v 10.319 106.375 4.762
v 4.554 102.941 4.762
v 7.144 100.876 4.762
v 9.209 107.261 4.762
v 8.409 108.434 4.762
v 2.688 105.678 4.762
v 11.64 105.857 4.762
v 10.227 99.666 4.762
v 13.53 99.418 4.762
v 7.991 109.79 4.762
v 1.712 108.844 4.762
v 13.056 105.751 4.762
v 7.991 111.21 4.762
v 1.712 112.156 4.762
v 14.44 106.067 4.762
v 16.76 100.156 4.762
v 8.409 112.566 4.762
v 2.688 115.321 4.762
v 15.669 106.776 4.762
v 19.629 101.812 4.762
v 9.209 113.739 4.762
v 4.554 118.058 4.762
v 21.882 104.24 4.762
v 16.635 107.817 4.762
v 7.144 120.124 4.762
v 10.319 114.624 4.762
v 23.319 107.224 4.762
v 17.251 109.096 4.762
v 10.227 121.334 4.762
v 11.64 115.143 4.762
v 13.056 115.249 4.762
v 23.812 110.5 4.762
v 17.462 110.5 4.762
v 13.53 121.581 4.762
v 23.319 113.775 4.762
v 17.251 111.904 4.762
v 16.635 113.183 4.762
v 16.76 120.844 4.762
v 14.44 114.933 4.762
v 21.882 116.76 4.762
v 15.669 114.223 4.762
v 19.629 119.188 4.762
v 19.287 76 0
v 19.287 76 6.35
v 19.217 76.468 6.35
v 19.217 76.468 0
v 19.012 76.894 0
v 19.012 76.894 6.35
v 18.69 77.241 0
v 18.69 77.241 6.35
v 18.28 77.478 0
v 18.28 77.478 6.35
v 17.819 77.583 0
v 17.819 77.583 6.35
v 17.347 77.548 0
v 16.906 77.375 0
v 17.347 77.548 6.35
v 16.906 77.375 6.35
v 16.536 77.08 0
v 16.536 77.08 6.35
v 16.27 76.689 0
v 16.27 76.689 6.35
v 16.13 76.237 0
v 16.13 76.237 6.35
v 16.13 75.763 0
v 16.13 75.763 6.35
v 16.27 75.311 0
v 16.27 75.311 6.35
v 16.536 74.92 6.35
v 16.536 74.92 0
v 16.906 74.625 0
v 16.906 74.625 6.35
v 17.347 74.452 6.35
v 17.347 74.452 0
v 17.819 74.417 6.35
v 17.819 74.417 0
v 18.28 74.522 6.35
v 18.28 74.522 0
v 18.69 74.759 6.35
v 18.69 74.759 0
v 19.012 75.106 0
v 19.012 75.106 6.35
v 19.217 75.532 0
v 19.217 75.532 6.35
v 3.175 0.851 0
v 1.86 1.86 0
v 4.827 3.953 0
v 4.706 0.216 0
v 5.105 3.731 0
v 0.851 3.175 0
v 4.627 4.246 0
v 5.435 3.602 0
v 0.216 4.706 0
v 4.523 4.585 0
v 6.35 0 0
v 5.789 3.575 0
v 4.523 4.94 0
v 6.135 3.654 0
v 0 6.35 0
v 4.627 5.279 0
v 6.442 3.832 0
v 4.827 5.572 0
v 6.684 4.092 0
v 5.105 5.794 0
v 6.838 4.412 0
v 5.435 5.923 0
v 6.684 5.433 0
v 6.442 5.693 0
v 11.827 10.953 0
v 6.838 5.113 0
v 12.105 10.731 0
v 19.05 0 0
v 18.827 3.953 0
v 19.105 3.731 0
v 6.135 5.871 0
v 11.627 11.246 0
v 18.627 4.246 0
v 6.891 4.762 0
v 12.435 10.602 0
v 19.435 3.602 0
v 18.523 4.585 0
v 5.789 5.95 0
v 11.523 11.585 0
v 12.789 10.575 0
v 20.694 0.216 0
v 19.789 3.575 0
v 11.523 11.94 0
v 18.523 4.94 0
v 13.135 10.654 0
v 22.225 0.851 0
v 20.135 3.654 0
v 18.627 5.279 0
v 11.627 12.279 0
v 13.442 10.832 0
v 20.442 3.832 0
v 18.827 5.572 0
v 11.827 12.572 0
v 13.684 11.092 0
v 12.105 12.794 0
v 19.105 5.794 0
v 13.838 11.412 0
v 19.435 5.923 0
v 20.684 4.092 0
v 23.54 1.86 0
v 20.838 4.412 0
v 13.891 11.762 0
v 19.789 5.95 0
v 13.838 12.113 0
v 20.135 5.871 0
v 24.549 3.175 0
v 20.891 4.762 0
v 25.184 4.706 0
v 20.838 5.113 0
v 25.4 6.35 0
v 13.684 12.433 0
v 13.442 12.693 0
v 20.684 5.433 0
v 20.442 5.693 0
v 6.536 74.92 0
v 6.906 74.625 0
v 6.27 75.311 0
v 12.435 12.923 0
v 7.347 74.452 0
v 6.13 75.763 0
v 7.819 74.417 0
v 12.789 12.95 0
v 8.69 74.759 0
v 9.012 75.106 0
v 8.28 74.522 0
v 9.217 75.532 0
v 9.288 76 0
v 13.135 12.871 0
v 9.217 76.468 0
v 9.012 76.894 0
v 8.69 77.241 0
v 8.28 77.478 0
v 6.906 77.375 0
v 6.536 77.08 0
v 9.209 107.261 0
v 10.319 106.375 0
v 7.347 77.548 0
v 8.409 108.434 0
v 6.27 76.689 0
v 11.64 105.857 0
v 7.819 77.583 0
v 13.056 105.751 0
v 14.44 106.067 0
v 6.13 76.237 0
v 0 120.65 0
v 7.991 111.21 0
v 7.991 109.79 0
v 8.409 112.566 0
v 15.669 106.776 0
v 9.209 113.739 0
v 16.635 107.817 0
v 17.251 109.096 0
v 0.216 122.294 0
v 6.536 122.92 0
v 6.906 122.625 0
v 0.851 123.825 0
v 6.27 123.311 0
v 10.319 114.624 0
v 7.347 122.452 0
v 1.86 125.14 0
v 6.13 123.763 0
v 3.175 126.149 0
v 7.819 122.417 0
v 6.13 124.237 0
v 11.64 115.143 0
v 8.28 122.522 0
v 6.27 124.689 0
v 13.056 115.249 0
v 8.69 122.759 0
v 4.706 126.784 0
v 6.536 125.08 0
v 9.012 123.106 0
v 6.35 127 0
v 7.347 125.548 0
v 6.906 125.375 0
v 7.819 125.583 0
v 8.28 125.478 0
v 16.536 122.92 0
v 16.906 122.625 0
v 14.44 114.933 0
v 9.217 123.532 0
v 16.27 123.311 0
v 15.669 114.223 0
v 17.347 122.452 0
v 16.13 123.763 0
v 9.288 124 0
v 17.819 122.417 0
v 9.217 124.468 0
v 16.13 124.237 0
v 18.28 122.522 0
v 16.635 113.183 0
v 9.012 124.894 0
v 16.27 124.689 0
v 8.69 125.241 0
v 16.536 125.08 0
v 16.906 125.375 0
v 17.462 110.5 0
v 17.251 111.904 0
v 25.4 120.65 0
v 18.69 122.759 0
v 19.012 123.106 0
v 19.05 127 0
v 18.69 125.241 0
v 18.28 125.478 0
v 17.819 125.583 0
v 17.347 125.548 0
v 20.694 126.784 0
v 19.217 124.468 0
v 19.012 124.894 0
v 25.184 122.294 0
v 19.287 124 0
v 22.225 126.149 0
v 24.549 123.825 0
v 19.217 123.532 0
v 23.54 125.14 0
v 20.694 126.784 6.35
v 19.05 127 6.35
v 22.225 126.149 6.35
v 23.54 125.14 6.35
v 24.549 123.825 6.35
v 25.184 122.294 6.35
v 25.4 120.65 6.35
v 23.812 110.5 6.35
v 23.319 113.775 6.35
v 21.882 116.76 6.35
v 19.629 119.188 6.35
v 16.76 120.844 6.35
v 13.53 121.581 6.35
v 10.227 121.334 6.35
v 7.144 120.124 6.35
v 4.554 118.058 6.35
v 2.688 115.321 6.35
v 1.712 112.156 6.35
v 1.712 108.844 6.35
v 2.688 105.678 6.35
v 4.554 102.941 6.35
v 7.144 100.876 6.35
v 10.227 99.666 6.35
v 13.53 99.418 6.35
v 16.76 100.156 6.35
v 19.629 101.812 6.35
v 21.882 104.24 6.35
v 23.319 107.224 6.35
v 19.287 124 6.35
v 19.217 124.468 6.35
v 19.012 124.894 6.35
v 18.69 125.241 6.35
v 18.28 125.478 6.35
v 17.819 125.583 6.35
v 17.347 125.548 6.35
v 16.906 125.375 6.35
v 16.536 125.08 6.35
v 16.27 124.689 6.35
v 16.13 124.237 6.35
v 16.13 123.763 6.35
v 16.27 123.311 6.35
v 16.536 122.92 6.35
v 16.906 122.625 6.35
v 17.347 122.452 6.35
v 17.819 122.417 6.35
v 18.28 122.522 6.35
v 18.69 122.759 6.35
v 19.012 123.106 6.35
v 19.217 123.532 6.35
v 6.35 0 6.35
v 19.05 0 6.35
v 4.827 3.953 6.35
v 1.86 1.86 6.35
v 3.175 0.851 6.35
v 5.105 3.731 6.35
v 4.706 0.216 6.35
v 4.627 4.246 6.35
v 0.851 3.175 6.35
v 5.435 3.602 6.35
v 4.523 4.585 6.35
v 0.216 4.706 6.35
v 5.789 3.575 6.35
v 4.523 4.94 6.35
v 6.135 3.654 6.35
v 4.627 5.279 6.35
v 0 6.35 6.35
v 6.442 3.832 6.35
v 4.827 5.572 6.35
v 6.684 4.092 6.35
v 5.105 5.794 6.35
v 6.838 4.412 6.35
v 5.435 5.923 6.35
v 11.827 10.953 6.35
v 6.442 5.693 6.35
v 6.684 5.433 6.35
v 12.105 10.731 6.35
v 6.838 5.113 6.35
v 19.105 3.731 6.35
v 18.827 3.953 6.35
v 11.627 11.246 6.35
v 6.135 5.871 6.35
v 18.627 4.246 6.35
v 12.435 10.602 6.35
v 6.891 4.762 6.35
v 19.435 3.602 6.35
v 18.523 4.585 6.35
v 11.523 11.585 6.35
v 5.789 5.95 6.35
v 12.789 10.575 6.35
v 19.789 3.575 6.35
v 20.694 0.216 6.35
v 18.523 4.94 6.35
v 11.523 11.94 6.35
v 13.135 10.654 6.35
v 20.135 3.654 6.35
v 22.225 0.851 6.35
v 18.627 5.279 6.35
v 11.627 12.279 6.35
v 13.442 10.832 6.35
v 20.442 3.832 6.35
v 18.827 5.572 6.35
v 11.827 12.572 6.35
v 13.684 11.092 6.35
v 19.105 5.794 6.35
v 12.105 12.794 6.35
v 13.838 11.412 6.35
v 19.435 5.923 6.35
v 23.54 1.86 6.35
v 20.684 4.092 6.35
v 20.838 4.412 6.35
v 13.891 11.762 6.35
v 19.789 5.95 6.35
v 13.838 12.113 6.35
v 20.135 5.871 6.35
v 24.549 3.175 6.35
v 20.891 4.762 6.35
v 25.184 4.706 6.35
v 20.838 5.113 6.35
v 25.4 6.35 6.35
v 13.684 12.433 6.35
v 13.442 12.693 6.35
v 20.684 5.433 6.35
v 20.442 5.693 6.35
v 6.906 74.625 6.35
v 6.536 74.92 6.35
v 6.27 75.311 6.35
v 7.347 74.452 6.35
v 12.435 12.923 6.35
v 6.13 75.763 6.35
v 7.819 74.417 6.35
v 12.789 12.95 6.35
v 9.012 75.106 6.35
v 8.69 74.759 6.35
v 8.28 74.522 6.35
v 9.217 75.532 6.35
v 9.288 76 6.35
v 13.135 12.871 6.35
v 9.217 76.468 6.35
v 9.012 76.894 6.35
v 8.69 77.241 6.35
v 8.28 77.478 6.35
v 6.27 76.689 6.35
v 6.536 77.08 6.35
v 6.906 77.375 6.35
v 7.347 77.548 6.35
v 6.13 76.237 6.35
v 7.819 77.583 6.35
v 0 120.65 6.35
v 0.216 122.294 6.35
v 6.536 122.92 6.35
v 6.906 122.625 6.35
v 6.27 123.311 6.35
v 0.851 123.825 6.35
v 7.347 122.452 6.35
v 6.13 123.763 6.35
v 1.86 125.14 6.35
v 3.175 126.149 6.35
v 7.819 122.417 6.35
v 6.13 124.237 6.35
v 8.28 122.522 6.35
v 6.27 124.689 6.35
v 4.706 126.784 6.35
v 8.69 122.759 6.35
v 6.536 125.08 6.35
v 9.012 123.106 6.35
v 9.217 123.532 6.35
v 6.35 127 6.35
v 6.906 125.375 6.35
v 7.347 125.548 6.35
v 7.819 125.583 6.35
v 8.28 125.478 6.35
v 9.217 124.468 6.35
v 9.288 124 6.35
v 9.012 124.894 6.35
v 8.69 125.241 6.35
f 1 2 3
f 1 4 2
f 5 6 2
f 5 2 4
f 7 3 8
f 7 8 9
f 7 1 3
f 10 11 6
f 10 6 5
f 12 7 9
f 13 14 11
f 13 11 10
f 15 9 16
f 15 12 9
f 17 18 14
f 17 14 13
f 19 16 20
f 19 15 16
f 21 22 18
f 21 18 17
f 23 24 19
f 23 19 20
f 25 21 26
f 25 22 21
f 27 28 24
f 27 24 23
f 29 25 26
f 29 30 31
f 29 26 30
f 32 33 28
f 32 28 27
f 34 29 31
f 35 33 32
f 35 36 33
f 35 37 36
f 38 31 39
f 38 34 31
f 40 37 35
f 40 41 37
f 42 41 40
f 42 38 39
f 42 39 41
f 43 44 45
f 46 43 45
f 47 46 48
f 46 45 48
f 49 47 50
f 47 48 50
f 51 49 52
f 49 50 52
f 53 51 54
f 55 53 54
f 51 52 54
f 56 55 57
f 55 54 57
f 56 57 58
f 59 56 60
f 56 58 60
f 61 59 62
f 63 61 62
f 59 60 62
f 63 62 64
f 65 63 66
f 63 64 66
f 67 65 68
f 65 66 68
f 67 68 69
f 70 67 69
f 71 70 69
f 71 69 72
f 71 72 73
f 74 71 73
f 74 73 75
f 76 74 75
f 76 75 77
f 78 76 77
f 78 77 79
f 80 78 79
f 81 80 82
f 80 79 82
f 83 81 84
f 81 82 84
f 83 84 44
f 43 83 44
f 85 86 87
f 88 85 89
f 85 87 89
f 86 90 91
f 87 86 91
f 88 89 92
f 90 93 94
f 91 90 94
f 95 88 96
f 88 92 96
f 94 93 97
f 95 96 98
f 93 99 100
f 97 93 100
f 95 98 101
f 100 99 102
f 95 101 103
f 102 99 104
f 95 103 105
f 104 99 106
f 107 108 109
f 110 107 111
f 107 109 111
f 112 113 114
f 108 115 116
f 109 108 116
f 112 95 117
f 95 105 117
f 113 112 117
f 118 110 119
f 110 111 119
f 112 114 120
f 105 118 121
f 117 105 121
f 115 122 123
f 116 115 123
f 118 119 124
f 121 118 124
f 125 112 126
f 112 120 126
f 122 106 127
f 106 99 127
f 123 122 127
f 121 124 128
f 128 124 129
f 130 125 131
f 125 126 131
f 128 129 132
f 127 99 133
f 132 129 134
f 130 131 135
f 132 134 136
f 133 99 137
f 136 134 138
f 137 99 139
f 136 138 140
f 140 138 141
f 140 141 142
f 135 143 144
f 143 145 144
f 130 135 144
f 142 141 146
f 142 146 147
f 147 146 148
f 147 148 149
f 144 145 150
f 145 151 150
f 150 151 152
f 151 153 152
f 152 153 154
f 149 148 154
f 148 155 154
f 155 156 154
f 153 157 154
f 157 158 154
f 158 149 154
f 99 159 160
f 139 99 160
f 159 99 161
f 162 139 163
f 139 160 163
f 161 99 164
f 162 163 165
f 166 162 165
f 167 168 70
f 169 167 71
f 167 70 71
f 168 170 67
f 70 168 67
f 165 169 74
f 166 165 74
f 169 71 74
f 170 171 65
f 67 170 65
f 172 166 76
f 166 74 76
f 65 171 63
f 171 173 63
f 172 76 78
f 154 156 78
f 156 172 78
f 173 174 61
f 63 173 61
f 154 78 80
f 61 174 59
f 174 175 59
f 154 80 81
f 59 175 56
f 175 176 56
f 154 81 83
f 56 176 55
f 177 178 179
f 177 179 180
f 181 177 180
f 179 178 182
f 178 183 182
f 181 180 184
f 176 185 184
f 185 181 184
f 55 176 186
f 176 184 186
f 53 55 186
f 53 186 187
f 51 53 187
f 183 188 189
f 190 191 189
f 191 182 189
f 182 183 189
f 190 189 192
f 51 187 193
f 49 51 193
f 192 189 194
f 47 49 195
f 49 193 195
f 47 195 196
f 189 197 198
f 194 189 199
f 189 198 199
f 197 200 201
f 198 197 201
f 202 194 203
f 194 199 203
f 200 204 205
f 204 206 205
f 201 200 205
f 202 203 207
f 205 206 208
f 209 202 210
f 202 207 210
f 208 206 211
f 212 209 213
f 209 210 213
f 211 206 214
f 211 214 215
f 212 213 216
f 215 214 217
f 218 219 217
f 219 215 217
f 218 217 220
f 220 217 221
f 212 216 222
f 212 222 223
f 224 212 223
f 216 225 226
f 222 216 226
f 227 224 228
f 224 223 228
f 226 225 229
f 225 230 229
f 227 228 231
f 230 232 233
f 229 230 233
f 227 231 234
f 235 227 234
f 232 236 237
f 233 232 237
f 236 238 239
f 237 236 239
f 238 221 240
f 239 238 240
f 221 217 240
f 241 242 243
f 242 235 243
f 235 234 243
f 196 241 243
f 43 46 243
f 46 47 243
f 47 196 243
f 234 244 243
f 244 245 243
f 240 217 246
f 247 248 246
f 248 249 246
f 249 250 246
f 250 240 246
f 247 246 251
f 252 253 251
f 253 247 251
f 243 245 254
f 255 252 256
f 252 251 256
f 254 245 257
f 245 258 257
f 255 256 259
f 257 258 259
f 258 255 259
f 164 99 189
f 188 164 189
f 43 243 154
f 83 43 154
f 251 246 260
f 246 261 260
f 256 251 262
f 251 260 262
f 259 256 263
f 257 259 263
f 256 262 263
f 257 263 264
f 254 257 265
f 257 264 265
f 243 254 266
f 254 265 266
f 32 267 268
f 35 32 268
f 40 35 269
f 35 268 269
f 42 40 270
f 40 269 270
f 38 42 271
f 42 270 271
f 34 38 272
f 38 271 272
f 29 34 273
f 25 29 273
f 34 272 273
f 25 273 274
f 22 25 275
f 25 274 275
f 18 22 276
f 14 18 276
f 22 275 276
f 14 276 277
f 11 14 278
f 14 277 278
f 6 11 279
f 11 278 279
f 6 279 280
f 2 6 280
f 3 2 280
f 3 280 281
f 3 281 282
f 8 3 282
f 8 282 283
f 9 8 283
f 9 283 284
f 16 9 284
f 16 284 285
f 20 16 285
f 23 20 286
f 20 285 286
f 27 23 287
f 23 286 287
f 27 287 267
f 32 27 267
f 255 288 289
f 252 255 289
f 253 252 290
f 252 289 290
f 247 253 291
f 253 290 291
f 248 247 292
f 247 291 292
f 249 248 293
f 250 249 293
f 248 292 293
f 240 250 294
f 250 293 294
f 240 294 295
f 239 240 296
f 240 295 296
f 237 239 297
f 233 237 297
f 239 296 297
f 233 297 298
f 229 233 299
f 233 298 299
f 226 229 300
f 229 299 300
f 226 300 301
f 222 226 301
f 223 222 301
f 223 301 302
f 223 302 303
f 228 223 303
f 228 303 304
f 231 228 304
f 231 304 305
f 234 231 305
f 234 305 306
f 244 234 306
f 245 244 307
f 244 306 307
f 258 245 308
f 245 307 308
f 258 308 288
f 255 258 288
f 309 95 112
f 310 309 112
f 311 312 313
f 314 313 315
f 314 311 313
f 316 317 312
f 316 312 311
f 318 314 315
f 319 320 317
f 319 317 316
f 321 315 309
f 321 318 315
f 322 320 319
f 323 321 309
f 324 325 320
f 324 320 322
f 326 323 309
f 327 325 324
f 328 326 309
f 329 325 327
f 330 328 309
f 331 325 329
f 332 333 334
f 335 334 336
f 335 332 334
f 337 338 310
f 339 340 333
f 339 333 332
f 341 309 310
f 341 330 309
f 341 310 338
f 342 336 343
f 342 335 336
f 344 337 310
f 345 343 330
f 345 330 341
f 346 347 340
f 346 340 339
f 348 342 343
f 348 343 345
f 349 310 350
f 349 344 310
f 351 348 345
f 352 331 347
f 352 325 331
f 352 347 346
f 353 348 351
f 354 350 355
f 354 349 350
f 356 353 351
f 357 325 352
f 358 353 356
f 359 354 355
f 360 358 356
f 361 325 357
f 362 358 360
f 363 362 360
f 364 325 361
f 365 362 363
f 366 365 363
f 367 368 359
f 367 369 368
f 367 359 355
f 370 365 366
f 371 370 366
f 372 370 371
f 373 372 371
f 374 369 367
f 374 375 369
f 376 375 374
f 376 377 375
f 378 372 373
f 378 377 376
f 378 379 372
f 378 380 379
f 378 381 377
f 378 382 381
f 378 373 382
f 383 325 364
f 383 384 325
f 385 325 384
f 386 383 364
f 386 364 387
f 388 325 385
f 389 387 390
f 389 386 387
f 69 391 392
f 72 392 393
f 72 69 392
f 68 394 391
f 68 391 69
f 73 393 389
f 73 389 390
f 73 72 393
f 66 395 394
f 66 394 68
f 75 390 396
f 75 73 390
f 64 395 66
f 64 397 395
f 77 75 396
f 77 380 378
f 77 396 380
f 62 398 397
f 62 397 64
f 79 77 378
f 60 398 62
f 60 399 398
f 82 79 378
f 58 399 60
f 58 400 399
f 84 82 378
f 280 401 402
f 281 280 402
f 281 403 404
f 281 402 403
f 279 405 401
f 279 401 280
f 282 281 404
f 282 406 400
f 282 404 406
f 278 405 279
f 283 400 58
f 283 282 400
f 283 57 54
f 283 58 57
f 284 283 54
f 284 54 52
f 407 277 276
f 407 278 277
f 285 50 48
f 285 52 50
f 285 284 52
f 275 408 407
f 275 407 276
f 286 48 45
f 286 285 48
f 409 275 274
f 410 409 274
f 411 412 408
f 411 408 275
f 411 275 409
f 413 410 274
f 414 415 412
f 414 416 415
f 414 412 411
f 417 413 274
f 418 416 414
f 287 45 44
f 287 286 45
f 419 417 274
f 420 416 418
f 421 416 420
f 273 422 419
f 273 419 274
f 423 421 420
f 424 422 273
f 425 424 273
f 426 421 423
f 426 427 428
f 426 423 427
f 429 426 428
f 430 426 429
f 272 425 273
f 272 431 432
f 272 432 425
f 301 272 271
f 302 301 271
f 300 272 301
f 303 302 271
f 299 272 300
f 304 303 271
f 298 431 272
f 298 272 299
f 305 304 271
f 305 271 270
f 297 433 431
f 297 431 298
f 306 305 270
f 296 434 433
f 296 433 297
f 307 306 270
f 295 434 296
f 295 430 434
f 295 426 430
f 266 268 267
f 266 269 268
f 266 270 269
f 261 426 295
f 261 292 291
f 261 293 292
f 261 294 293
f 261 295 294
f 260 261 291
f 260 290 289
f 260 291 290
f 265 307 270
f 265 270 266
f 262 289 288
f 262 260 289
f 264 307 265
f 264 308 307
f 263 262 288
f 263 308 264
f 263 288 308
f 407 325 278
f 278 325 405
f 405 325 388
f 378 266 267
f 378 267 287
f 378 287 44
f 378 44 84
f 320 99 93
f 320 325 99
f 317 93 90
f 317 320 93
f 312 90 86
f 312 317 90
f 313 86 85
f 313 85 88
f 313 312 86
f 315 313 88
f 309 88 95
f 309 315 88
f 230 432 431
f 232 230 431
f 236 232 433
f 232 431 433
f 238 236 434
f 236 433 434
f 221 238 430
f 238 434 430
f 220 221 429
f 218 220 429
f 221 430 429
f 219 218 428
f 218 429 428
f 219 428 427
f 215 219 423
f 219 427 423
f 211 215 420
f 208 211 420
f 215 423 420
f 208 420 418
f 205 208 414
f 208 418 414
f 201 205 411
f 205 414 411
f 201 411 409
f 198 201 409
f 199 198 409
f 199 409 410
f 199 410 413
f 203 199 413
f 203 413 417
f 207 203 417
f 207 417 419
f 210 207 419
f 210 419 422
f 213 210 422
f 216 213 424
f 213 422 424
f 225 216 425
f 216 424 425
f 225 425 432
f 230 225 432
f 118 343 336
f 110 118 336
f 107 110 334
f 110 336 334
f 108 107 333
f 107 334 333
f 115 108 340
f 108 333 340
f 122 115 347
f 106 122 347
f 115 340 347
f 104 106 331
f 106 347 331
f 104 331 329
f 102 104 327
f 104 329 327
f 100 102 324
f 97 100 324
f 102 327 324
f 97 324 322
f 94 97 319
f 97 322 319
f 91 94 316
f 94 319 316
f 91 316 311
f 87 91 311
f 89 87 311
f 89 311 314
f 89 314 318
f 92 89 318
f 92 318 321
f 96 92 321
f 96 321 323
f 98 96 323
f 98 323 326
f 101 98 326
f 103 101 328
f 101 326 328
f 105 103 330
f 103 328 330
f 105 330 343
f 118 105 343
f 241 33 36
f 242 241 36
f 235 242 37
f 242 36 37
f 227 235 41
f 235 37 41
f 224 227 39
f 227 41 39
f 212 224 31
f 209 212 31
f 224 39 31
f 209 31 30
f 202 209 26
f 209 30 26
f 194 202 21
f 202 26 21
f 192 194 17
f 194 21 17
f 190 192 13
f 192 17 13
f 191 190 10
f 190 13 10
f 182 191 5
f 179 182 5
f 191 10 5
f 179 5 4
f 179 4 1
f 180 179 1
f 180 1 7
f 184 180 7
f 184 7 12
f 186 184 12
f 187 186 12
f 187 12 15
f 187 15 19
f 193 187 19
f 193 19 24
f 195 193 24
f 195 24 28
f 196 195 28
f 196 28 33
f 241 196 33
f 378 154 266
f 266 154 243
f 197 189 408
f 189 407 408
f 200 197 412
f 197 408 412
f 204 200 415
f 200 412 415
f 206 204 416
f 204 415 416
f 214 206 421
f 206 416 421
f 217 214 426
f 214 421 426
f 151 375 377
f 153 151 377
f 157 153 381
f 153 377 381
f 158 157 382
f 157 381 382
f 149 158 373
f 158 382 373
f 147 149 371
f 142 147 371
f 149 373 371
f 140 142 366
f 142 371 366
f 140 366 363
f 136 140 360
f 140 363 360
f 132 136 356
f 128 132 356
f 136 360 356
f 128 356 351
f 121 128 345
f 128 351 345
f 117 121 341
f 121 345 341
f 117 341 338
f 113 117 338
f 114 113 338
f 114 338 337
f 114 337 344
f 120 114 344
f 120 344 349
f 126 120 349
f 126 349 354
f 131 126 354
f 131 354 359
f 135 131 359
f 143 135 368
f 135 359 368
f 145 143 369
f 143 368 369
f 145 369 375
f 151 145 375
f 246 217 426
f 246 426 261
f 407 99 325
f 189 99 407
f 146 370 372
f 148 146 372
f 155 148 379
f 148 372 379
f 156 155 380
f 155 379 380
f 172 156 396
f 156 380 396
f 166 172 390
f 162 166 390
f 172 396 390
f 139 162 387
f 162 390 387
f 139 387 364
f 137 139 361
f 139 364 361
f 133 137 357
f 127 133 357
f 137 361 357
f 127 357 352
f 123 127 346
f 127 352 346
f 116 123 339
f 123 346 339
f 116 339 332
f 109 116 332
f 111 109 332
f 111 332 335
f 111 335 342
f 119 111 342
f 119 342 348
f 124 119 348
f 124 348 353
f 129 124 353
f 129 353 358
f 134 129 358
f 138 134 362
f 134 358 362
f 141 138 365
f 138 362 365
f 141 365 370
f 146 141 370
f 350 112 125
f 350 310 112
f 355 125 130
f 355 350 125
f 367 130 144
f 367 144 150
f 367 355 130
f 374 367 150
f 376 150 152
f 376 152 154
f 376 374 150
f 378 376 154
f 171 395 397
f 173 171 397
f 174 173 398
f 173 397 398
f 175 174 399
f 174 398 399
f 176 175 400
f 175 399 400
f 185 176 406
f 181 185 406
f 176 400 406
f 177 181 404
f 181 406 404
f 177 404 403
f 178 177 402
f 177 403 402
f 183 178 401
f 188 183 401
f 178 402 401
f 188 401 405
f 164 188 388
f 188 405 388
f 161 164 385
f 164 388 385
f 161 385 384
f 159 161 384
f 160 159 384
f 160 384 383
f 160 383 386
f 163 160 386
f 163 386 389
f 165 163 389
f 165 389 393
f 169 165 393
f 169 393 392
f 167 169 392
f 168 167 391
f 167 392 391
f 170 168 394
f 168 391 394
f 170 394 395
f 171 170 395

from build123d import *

# Parameters (mm, degrees)
SKETCH1_W           = 25.4
SKETCH1_H           = 127
BOSS_EXTRUDE1_DEPTH = 6.35
SKETCH2_R           = 1.190625
CUT_EXTRUDE1_DEPTH  = 6.35
FILLET1_R           = 6.35
SKETCH3_R           = 4.7625
CUT_EXTRUDE2_DEPTH  = 6.35
FILLET2_R           = 6.35
SKETCH4_R           = 11.1125
CUT_EXTRUDE3_DEPTH  = 1.5875
SKETCH5_R           = 1.5875
CUT_EXTRUDE4_DEPTH  = 6.35


with BuildPart() as part:
    # Sketch1 → Boss-Extrude1 (new body)
    with BuildSketch(Plane.XY):
        with Locations((12.7, 63.5)):
            Rectangle(SKETCH1_W, SKETCH1_H)
    extrude(amount=BOSS_EXTRUDE1_DEPTH)

    # Sketch2 → Cut-Extrude1 (cut)
    with BuildSketch(Plane.XY.offset(6.35)):
        with Locations((5.7, 4.7625)):
            Circle(SKETCH2_R)
        with Locations((19.7, 4.7625)):
            Circle(SKETCH2_R)
        with Locations((12.7, 11.7625)):
            Circle(SKETCH2_R)
    extrude(amount=-CUT_EXTRUDE1_DEPTH, mode=Mode.SUBTRACT)

    # Fillet1
    fillet1_edges = [part.edges().sort_by_distance(p)[0] for p in [
        (25.4, 0, 3.175),
        (0, 0, 3.175),
    ]]
    fillet(fillet1_edges, radius=FILLET1_R)

    # Sketch3 → Cut-Extrude2 (cut)
    with BuildSketch(Plane.XY.offset(6.35)):
        with Locations((12.7, 110.499906)):
            Circle(SKETCH3_R)
    extrude(amount=-CUT_EXTRUDE2_DEPTH, mode=Mode.SUBTRACT)

    # Fillet2
    fillet2_edges = [part.edges().sort_by_distance(p)[0] for p in [
        (0, 127, 3.175),
        (25.4, 127, 3.175),
    ]]
    fillet(fillet2_edges, radius=FILLET2_R)

    # Sketch4 → Cut-Extrude3 (cut)
    with BuildSketch(Plane.XY.offset(6.35)):
        with Locations((12.7, 110.499906)):
            Circle(SKETCH4_R)
    extrude(amount=-CUT_EXTRUDE3_DEPTH, mode=Mode.SUBTRACT)

    # Sketch5 → Cut-Extrude4 (cut)
    with BuildSketch(Plane.XY.offset(6.35)):
        with Locations((17.7, 124)):
            Circle(SKETCH5_R)
        with Locations((7.7, 124)):
            Circle(SKETCH5_R)
        with Locations((17.7, 76)):
            Circle(SKETCH5_R)
        with Locations((7.7, 76)):
            Circle(SKETCH5_R)
    extrude(amount=-CUT_EXTRUDE4_DEPTH, mode=Mode.SUBTRACT)


solid = part.part
